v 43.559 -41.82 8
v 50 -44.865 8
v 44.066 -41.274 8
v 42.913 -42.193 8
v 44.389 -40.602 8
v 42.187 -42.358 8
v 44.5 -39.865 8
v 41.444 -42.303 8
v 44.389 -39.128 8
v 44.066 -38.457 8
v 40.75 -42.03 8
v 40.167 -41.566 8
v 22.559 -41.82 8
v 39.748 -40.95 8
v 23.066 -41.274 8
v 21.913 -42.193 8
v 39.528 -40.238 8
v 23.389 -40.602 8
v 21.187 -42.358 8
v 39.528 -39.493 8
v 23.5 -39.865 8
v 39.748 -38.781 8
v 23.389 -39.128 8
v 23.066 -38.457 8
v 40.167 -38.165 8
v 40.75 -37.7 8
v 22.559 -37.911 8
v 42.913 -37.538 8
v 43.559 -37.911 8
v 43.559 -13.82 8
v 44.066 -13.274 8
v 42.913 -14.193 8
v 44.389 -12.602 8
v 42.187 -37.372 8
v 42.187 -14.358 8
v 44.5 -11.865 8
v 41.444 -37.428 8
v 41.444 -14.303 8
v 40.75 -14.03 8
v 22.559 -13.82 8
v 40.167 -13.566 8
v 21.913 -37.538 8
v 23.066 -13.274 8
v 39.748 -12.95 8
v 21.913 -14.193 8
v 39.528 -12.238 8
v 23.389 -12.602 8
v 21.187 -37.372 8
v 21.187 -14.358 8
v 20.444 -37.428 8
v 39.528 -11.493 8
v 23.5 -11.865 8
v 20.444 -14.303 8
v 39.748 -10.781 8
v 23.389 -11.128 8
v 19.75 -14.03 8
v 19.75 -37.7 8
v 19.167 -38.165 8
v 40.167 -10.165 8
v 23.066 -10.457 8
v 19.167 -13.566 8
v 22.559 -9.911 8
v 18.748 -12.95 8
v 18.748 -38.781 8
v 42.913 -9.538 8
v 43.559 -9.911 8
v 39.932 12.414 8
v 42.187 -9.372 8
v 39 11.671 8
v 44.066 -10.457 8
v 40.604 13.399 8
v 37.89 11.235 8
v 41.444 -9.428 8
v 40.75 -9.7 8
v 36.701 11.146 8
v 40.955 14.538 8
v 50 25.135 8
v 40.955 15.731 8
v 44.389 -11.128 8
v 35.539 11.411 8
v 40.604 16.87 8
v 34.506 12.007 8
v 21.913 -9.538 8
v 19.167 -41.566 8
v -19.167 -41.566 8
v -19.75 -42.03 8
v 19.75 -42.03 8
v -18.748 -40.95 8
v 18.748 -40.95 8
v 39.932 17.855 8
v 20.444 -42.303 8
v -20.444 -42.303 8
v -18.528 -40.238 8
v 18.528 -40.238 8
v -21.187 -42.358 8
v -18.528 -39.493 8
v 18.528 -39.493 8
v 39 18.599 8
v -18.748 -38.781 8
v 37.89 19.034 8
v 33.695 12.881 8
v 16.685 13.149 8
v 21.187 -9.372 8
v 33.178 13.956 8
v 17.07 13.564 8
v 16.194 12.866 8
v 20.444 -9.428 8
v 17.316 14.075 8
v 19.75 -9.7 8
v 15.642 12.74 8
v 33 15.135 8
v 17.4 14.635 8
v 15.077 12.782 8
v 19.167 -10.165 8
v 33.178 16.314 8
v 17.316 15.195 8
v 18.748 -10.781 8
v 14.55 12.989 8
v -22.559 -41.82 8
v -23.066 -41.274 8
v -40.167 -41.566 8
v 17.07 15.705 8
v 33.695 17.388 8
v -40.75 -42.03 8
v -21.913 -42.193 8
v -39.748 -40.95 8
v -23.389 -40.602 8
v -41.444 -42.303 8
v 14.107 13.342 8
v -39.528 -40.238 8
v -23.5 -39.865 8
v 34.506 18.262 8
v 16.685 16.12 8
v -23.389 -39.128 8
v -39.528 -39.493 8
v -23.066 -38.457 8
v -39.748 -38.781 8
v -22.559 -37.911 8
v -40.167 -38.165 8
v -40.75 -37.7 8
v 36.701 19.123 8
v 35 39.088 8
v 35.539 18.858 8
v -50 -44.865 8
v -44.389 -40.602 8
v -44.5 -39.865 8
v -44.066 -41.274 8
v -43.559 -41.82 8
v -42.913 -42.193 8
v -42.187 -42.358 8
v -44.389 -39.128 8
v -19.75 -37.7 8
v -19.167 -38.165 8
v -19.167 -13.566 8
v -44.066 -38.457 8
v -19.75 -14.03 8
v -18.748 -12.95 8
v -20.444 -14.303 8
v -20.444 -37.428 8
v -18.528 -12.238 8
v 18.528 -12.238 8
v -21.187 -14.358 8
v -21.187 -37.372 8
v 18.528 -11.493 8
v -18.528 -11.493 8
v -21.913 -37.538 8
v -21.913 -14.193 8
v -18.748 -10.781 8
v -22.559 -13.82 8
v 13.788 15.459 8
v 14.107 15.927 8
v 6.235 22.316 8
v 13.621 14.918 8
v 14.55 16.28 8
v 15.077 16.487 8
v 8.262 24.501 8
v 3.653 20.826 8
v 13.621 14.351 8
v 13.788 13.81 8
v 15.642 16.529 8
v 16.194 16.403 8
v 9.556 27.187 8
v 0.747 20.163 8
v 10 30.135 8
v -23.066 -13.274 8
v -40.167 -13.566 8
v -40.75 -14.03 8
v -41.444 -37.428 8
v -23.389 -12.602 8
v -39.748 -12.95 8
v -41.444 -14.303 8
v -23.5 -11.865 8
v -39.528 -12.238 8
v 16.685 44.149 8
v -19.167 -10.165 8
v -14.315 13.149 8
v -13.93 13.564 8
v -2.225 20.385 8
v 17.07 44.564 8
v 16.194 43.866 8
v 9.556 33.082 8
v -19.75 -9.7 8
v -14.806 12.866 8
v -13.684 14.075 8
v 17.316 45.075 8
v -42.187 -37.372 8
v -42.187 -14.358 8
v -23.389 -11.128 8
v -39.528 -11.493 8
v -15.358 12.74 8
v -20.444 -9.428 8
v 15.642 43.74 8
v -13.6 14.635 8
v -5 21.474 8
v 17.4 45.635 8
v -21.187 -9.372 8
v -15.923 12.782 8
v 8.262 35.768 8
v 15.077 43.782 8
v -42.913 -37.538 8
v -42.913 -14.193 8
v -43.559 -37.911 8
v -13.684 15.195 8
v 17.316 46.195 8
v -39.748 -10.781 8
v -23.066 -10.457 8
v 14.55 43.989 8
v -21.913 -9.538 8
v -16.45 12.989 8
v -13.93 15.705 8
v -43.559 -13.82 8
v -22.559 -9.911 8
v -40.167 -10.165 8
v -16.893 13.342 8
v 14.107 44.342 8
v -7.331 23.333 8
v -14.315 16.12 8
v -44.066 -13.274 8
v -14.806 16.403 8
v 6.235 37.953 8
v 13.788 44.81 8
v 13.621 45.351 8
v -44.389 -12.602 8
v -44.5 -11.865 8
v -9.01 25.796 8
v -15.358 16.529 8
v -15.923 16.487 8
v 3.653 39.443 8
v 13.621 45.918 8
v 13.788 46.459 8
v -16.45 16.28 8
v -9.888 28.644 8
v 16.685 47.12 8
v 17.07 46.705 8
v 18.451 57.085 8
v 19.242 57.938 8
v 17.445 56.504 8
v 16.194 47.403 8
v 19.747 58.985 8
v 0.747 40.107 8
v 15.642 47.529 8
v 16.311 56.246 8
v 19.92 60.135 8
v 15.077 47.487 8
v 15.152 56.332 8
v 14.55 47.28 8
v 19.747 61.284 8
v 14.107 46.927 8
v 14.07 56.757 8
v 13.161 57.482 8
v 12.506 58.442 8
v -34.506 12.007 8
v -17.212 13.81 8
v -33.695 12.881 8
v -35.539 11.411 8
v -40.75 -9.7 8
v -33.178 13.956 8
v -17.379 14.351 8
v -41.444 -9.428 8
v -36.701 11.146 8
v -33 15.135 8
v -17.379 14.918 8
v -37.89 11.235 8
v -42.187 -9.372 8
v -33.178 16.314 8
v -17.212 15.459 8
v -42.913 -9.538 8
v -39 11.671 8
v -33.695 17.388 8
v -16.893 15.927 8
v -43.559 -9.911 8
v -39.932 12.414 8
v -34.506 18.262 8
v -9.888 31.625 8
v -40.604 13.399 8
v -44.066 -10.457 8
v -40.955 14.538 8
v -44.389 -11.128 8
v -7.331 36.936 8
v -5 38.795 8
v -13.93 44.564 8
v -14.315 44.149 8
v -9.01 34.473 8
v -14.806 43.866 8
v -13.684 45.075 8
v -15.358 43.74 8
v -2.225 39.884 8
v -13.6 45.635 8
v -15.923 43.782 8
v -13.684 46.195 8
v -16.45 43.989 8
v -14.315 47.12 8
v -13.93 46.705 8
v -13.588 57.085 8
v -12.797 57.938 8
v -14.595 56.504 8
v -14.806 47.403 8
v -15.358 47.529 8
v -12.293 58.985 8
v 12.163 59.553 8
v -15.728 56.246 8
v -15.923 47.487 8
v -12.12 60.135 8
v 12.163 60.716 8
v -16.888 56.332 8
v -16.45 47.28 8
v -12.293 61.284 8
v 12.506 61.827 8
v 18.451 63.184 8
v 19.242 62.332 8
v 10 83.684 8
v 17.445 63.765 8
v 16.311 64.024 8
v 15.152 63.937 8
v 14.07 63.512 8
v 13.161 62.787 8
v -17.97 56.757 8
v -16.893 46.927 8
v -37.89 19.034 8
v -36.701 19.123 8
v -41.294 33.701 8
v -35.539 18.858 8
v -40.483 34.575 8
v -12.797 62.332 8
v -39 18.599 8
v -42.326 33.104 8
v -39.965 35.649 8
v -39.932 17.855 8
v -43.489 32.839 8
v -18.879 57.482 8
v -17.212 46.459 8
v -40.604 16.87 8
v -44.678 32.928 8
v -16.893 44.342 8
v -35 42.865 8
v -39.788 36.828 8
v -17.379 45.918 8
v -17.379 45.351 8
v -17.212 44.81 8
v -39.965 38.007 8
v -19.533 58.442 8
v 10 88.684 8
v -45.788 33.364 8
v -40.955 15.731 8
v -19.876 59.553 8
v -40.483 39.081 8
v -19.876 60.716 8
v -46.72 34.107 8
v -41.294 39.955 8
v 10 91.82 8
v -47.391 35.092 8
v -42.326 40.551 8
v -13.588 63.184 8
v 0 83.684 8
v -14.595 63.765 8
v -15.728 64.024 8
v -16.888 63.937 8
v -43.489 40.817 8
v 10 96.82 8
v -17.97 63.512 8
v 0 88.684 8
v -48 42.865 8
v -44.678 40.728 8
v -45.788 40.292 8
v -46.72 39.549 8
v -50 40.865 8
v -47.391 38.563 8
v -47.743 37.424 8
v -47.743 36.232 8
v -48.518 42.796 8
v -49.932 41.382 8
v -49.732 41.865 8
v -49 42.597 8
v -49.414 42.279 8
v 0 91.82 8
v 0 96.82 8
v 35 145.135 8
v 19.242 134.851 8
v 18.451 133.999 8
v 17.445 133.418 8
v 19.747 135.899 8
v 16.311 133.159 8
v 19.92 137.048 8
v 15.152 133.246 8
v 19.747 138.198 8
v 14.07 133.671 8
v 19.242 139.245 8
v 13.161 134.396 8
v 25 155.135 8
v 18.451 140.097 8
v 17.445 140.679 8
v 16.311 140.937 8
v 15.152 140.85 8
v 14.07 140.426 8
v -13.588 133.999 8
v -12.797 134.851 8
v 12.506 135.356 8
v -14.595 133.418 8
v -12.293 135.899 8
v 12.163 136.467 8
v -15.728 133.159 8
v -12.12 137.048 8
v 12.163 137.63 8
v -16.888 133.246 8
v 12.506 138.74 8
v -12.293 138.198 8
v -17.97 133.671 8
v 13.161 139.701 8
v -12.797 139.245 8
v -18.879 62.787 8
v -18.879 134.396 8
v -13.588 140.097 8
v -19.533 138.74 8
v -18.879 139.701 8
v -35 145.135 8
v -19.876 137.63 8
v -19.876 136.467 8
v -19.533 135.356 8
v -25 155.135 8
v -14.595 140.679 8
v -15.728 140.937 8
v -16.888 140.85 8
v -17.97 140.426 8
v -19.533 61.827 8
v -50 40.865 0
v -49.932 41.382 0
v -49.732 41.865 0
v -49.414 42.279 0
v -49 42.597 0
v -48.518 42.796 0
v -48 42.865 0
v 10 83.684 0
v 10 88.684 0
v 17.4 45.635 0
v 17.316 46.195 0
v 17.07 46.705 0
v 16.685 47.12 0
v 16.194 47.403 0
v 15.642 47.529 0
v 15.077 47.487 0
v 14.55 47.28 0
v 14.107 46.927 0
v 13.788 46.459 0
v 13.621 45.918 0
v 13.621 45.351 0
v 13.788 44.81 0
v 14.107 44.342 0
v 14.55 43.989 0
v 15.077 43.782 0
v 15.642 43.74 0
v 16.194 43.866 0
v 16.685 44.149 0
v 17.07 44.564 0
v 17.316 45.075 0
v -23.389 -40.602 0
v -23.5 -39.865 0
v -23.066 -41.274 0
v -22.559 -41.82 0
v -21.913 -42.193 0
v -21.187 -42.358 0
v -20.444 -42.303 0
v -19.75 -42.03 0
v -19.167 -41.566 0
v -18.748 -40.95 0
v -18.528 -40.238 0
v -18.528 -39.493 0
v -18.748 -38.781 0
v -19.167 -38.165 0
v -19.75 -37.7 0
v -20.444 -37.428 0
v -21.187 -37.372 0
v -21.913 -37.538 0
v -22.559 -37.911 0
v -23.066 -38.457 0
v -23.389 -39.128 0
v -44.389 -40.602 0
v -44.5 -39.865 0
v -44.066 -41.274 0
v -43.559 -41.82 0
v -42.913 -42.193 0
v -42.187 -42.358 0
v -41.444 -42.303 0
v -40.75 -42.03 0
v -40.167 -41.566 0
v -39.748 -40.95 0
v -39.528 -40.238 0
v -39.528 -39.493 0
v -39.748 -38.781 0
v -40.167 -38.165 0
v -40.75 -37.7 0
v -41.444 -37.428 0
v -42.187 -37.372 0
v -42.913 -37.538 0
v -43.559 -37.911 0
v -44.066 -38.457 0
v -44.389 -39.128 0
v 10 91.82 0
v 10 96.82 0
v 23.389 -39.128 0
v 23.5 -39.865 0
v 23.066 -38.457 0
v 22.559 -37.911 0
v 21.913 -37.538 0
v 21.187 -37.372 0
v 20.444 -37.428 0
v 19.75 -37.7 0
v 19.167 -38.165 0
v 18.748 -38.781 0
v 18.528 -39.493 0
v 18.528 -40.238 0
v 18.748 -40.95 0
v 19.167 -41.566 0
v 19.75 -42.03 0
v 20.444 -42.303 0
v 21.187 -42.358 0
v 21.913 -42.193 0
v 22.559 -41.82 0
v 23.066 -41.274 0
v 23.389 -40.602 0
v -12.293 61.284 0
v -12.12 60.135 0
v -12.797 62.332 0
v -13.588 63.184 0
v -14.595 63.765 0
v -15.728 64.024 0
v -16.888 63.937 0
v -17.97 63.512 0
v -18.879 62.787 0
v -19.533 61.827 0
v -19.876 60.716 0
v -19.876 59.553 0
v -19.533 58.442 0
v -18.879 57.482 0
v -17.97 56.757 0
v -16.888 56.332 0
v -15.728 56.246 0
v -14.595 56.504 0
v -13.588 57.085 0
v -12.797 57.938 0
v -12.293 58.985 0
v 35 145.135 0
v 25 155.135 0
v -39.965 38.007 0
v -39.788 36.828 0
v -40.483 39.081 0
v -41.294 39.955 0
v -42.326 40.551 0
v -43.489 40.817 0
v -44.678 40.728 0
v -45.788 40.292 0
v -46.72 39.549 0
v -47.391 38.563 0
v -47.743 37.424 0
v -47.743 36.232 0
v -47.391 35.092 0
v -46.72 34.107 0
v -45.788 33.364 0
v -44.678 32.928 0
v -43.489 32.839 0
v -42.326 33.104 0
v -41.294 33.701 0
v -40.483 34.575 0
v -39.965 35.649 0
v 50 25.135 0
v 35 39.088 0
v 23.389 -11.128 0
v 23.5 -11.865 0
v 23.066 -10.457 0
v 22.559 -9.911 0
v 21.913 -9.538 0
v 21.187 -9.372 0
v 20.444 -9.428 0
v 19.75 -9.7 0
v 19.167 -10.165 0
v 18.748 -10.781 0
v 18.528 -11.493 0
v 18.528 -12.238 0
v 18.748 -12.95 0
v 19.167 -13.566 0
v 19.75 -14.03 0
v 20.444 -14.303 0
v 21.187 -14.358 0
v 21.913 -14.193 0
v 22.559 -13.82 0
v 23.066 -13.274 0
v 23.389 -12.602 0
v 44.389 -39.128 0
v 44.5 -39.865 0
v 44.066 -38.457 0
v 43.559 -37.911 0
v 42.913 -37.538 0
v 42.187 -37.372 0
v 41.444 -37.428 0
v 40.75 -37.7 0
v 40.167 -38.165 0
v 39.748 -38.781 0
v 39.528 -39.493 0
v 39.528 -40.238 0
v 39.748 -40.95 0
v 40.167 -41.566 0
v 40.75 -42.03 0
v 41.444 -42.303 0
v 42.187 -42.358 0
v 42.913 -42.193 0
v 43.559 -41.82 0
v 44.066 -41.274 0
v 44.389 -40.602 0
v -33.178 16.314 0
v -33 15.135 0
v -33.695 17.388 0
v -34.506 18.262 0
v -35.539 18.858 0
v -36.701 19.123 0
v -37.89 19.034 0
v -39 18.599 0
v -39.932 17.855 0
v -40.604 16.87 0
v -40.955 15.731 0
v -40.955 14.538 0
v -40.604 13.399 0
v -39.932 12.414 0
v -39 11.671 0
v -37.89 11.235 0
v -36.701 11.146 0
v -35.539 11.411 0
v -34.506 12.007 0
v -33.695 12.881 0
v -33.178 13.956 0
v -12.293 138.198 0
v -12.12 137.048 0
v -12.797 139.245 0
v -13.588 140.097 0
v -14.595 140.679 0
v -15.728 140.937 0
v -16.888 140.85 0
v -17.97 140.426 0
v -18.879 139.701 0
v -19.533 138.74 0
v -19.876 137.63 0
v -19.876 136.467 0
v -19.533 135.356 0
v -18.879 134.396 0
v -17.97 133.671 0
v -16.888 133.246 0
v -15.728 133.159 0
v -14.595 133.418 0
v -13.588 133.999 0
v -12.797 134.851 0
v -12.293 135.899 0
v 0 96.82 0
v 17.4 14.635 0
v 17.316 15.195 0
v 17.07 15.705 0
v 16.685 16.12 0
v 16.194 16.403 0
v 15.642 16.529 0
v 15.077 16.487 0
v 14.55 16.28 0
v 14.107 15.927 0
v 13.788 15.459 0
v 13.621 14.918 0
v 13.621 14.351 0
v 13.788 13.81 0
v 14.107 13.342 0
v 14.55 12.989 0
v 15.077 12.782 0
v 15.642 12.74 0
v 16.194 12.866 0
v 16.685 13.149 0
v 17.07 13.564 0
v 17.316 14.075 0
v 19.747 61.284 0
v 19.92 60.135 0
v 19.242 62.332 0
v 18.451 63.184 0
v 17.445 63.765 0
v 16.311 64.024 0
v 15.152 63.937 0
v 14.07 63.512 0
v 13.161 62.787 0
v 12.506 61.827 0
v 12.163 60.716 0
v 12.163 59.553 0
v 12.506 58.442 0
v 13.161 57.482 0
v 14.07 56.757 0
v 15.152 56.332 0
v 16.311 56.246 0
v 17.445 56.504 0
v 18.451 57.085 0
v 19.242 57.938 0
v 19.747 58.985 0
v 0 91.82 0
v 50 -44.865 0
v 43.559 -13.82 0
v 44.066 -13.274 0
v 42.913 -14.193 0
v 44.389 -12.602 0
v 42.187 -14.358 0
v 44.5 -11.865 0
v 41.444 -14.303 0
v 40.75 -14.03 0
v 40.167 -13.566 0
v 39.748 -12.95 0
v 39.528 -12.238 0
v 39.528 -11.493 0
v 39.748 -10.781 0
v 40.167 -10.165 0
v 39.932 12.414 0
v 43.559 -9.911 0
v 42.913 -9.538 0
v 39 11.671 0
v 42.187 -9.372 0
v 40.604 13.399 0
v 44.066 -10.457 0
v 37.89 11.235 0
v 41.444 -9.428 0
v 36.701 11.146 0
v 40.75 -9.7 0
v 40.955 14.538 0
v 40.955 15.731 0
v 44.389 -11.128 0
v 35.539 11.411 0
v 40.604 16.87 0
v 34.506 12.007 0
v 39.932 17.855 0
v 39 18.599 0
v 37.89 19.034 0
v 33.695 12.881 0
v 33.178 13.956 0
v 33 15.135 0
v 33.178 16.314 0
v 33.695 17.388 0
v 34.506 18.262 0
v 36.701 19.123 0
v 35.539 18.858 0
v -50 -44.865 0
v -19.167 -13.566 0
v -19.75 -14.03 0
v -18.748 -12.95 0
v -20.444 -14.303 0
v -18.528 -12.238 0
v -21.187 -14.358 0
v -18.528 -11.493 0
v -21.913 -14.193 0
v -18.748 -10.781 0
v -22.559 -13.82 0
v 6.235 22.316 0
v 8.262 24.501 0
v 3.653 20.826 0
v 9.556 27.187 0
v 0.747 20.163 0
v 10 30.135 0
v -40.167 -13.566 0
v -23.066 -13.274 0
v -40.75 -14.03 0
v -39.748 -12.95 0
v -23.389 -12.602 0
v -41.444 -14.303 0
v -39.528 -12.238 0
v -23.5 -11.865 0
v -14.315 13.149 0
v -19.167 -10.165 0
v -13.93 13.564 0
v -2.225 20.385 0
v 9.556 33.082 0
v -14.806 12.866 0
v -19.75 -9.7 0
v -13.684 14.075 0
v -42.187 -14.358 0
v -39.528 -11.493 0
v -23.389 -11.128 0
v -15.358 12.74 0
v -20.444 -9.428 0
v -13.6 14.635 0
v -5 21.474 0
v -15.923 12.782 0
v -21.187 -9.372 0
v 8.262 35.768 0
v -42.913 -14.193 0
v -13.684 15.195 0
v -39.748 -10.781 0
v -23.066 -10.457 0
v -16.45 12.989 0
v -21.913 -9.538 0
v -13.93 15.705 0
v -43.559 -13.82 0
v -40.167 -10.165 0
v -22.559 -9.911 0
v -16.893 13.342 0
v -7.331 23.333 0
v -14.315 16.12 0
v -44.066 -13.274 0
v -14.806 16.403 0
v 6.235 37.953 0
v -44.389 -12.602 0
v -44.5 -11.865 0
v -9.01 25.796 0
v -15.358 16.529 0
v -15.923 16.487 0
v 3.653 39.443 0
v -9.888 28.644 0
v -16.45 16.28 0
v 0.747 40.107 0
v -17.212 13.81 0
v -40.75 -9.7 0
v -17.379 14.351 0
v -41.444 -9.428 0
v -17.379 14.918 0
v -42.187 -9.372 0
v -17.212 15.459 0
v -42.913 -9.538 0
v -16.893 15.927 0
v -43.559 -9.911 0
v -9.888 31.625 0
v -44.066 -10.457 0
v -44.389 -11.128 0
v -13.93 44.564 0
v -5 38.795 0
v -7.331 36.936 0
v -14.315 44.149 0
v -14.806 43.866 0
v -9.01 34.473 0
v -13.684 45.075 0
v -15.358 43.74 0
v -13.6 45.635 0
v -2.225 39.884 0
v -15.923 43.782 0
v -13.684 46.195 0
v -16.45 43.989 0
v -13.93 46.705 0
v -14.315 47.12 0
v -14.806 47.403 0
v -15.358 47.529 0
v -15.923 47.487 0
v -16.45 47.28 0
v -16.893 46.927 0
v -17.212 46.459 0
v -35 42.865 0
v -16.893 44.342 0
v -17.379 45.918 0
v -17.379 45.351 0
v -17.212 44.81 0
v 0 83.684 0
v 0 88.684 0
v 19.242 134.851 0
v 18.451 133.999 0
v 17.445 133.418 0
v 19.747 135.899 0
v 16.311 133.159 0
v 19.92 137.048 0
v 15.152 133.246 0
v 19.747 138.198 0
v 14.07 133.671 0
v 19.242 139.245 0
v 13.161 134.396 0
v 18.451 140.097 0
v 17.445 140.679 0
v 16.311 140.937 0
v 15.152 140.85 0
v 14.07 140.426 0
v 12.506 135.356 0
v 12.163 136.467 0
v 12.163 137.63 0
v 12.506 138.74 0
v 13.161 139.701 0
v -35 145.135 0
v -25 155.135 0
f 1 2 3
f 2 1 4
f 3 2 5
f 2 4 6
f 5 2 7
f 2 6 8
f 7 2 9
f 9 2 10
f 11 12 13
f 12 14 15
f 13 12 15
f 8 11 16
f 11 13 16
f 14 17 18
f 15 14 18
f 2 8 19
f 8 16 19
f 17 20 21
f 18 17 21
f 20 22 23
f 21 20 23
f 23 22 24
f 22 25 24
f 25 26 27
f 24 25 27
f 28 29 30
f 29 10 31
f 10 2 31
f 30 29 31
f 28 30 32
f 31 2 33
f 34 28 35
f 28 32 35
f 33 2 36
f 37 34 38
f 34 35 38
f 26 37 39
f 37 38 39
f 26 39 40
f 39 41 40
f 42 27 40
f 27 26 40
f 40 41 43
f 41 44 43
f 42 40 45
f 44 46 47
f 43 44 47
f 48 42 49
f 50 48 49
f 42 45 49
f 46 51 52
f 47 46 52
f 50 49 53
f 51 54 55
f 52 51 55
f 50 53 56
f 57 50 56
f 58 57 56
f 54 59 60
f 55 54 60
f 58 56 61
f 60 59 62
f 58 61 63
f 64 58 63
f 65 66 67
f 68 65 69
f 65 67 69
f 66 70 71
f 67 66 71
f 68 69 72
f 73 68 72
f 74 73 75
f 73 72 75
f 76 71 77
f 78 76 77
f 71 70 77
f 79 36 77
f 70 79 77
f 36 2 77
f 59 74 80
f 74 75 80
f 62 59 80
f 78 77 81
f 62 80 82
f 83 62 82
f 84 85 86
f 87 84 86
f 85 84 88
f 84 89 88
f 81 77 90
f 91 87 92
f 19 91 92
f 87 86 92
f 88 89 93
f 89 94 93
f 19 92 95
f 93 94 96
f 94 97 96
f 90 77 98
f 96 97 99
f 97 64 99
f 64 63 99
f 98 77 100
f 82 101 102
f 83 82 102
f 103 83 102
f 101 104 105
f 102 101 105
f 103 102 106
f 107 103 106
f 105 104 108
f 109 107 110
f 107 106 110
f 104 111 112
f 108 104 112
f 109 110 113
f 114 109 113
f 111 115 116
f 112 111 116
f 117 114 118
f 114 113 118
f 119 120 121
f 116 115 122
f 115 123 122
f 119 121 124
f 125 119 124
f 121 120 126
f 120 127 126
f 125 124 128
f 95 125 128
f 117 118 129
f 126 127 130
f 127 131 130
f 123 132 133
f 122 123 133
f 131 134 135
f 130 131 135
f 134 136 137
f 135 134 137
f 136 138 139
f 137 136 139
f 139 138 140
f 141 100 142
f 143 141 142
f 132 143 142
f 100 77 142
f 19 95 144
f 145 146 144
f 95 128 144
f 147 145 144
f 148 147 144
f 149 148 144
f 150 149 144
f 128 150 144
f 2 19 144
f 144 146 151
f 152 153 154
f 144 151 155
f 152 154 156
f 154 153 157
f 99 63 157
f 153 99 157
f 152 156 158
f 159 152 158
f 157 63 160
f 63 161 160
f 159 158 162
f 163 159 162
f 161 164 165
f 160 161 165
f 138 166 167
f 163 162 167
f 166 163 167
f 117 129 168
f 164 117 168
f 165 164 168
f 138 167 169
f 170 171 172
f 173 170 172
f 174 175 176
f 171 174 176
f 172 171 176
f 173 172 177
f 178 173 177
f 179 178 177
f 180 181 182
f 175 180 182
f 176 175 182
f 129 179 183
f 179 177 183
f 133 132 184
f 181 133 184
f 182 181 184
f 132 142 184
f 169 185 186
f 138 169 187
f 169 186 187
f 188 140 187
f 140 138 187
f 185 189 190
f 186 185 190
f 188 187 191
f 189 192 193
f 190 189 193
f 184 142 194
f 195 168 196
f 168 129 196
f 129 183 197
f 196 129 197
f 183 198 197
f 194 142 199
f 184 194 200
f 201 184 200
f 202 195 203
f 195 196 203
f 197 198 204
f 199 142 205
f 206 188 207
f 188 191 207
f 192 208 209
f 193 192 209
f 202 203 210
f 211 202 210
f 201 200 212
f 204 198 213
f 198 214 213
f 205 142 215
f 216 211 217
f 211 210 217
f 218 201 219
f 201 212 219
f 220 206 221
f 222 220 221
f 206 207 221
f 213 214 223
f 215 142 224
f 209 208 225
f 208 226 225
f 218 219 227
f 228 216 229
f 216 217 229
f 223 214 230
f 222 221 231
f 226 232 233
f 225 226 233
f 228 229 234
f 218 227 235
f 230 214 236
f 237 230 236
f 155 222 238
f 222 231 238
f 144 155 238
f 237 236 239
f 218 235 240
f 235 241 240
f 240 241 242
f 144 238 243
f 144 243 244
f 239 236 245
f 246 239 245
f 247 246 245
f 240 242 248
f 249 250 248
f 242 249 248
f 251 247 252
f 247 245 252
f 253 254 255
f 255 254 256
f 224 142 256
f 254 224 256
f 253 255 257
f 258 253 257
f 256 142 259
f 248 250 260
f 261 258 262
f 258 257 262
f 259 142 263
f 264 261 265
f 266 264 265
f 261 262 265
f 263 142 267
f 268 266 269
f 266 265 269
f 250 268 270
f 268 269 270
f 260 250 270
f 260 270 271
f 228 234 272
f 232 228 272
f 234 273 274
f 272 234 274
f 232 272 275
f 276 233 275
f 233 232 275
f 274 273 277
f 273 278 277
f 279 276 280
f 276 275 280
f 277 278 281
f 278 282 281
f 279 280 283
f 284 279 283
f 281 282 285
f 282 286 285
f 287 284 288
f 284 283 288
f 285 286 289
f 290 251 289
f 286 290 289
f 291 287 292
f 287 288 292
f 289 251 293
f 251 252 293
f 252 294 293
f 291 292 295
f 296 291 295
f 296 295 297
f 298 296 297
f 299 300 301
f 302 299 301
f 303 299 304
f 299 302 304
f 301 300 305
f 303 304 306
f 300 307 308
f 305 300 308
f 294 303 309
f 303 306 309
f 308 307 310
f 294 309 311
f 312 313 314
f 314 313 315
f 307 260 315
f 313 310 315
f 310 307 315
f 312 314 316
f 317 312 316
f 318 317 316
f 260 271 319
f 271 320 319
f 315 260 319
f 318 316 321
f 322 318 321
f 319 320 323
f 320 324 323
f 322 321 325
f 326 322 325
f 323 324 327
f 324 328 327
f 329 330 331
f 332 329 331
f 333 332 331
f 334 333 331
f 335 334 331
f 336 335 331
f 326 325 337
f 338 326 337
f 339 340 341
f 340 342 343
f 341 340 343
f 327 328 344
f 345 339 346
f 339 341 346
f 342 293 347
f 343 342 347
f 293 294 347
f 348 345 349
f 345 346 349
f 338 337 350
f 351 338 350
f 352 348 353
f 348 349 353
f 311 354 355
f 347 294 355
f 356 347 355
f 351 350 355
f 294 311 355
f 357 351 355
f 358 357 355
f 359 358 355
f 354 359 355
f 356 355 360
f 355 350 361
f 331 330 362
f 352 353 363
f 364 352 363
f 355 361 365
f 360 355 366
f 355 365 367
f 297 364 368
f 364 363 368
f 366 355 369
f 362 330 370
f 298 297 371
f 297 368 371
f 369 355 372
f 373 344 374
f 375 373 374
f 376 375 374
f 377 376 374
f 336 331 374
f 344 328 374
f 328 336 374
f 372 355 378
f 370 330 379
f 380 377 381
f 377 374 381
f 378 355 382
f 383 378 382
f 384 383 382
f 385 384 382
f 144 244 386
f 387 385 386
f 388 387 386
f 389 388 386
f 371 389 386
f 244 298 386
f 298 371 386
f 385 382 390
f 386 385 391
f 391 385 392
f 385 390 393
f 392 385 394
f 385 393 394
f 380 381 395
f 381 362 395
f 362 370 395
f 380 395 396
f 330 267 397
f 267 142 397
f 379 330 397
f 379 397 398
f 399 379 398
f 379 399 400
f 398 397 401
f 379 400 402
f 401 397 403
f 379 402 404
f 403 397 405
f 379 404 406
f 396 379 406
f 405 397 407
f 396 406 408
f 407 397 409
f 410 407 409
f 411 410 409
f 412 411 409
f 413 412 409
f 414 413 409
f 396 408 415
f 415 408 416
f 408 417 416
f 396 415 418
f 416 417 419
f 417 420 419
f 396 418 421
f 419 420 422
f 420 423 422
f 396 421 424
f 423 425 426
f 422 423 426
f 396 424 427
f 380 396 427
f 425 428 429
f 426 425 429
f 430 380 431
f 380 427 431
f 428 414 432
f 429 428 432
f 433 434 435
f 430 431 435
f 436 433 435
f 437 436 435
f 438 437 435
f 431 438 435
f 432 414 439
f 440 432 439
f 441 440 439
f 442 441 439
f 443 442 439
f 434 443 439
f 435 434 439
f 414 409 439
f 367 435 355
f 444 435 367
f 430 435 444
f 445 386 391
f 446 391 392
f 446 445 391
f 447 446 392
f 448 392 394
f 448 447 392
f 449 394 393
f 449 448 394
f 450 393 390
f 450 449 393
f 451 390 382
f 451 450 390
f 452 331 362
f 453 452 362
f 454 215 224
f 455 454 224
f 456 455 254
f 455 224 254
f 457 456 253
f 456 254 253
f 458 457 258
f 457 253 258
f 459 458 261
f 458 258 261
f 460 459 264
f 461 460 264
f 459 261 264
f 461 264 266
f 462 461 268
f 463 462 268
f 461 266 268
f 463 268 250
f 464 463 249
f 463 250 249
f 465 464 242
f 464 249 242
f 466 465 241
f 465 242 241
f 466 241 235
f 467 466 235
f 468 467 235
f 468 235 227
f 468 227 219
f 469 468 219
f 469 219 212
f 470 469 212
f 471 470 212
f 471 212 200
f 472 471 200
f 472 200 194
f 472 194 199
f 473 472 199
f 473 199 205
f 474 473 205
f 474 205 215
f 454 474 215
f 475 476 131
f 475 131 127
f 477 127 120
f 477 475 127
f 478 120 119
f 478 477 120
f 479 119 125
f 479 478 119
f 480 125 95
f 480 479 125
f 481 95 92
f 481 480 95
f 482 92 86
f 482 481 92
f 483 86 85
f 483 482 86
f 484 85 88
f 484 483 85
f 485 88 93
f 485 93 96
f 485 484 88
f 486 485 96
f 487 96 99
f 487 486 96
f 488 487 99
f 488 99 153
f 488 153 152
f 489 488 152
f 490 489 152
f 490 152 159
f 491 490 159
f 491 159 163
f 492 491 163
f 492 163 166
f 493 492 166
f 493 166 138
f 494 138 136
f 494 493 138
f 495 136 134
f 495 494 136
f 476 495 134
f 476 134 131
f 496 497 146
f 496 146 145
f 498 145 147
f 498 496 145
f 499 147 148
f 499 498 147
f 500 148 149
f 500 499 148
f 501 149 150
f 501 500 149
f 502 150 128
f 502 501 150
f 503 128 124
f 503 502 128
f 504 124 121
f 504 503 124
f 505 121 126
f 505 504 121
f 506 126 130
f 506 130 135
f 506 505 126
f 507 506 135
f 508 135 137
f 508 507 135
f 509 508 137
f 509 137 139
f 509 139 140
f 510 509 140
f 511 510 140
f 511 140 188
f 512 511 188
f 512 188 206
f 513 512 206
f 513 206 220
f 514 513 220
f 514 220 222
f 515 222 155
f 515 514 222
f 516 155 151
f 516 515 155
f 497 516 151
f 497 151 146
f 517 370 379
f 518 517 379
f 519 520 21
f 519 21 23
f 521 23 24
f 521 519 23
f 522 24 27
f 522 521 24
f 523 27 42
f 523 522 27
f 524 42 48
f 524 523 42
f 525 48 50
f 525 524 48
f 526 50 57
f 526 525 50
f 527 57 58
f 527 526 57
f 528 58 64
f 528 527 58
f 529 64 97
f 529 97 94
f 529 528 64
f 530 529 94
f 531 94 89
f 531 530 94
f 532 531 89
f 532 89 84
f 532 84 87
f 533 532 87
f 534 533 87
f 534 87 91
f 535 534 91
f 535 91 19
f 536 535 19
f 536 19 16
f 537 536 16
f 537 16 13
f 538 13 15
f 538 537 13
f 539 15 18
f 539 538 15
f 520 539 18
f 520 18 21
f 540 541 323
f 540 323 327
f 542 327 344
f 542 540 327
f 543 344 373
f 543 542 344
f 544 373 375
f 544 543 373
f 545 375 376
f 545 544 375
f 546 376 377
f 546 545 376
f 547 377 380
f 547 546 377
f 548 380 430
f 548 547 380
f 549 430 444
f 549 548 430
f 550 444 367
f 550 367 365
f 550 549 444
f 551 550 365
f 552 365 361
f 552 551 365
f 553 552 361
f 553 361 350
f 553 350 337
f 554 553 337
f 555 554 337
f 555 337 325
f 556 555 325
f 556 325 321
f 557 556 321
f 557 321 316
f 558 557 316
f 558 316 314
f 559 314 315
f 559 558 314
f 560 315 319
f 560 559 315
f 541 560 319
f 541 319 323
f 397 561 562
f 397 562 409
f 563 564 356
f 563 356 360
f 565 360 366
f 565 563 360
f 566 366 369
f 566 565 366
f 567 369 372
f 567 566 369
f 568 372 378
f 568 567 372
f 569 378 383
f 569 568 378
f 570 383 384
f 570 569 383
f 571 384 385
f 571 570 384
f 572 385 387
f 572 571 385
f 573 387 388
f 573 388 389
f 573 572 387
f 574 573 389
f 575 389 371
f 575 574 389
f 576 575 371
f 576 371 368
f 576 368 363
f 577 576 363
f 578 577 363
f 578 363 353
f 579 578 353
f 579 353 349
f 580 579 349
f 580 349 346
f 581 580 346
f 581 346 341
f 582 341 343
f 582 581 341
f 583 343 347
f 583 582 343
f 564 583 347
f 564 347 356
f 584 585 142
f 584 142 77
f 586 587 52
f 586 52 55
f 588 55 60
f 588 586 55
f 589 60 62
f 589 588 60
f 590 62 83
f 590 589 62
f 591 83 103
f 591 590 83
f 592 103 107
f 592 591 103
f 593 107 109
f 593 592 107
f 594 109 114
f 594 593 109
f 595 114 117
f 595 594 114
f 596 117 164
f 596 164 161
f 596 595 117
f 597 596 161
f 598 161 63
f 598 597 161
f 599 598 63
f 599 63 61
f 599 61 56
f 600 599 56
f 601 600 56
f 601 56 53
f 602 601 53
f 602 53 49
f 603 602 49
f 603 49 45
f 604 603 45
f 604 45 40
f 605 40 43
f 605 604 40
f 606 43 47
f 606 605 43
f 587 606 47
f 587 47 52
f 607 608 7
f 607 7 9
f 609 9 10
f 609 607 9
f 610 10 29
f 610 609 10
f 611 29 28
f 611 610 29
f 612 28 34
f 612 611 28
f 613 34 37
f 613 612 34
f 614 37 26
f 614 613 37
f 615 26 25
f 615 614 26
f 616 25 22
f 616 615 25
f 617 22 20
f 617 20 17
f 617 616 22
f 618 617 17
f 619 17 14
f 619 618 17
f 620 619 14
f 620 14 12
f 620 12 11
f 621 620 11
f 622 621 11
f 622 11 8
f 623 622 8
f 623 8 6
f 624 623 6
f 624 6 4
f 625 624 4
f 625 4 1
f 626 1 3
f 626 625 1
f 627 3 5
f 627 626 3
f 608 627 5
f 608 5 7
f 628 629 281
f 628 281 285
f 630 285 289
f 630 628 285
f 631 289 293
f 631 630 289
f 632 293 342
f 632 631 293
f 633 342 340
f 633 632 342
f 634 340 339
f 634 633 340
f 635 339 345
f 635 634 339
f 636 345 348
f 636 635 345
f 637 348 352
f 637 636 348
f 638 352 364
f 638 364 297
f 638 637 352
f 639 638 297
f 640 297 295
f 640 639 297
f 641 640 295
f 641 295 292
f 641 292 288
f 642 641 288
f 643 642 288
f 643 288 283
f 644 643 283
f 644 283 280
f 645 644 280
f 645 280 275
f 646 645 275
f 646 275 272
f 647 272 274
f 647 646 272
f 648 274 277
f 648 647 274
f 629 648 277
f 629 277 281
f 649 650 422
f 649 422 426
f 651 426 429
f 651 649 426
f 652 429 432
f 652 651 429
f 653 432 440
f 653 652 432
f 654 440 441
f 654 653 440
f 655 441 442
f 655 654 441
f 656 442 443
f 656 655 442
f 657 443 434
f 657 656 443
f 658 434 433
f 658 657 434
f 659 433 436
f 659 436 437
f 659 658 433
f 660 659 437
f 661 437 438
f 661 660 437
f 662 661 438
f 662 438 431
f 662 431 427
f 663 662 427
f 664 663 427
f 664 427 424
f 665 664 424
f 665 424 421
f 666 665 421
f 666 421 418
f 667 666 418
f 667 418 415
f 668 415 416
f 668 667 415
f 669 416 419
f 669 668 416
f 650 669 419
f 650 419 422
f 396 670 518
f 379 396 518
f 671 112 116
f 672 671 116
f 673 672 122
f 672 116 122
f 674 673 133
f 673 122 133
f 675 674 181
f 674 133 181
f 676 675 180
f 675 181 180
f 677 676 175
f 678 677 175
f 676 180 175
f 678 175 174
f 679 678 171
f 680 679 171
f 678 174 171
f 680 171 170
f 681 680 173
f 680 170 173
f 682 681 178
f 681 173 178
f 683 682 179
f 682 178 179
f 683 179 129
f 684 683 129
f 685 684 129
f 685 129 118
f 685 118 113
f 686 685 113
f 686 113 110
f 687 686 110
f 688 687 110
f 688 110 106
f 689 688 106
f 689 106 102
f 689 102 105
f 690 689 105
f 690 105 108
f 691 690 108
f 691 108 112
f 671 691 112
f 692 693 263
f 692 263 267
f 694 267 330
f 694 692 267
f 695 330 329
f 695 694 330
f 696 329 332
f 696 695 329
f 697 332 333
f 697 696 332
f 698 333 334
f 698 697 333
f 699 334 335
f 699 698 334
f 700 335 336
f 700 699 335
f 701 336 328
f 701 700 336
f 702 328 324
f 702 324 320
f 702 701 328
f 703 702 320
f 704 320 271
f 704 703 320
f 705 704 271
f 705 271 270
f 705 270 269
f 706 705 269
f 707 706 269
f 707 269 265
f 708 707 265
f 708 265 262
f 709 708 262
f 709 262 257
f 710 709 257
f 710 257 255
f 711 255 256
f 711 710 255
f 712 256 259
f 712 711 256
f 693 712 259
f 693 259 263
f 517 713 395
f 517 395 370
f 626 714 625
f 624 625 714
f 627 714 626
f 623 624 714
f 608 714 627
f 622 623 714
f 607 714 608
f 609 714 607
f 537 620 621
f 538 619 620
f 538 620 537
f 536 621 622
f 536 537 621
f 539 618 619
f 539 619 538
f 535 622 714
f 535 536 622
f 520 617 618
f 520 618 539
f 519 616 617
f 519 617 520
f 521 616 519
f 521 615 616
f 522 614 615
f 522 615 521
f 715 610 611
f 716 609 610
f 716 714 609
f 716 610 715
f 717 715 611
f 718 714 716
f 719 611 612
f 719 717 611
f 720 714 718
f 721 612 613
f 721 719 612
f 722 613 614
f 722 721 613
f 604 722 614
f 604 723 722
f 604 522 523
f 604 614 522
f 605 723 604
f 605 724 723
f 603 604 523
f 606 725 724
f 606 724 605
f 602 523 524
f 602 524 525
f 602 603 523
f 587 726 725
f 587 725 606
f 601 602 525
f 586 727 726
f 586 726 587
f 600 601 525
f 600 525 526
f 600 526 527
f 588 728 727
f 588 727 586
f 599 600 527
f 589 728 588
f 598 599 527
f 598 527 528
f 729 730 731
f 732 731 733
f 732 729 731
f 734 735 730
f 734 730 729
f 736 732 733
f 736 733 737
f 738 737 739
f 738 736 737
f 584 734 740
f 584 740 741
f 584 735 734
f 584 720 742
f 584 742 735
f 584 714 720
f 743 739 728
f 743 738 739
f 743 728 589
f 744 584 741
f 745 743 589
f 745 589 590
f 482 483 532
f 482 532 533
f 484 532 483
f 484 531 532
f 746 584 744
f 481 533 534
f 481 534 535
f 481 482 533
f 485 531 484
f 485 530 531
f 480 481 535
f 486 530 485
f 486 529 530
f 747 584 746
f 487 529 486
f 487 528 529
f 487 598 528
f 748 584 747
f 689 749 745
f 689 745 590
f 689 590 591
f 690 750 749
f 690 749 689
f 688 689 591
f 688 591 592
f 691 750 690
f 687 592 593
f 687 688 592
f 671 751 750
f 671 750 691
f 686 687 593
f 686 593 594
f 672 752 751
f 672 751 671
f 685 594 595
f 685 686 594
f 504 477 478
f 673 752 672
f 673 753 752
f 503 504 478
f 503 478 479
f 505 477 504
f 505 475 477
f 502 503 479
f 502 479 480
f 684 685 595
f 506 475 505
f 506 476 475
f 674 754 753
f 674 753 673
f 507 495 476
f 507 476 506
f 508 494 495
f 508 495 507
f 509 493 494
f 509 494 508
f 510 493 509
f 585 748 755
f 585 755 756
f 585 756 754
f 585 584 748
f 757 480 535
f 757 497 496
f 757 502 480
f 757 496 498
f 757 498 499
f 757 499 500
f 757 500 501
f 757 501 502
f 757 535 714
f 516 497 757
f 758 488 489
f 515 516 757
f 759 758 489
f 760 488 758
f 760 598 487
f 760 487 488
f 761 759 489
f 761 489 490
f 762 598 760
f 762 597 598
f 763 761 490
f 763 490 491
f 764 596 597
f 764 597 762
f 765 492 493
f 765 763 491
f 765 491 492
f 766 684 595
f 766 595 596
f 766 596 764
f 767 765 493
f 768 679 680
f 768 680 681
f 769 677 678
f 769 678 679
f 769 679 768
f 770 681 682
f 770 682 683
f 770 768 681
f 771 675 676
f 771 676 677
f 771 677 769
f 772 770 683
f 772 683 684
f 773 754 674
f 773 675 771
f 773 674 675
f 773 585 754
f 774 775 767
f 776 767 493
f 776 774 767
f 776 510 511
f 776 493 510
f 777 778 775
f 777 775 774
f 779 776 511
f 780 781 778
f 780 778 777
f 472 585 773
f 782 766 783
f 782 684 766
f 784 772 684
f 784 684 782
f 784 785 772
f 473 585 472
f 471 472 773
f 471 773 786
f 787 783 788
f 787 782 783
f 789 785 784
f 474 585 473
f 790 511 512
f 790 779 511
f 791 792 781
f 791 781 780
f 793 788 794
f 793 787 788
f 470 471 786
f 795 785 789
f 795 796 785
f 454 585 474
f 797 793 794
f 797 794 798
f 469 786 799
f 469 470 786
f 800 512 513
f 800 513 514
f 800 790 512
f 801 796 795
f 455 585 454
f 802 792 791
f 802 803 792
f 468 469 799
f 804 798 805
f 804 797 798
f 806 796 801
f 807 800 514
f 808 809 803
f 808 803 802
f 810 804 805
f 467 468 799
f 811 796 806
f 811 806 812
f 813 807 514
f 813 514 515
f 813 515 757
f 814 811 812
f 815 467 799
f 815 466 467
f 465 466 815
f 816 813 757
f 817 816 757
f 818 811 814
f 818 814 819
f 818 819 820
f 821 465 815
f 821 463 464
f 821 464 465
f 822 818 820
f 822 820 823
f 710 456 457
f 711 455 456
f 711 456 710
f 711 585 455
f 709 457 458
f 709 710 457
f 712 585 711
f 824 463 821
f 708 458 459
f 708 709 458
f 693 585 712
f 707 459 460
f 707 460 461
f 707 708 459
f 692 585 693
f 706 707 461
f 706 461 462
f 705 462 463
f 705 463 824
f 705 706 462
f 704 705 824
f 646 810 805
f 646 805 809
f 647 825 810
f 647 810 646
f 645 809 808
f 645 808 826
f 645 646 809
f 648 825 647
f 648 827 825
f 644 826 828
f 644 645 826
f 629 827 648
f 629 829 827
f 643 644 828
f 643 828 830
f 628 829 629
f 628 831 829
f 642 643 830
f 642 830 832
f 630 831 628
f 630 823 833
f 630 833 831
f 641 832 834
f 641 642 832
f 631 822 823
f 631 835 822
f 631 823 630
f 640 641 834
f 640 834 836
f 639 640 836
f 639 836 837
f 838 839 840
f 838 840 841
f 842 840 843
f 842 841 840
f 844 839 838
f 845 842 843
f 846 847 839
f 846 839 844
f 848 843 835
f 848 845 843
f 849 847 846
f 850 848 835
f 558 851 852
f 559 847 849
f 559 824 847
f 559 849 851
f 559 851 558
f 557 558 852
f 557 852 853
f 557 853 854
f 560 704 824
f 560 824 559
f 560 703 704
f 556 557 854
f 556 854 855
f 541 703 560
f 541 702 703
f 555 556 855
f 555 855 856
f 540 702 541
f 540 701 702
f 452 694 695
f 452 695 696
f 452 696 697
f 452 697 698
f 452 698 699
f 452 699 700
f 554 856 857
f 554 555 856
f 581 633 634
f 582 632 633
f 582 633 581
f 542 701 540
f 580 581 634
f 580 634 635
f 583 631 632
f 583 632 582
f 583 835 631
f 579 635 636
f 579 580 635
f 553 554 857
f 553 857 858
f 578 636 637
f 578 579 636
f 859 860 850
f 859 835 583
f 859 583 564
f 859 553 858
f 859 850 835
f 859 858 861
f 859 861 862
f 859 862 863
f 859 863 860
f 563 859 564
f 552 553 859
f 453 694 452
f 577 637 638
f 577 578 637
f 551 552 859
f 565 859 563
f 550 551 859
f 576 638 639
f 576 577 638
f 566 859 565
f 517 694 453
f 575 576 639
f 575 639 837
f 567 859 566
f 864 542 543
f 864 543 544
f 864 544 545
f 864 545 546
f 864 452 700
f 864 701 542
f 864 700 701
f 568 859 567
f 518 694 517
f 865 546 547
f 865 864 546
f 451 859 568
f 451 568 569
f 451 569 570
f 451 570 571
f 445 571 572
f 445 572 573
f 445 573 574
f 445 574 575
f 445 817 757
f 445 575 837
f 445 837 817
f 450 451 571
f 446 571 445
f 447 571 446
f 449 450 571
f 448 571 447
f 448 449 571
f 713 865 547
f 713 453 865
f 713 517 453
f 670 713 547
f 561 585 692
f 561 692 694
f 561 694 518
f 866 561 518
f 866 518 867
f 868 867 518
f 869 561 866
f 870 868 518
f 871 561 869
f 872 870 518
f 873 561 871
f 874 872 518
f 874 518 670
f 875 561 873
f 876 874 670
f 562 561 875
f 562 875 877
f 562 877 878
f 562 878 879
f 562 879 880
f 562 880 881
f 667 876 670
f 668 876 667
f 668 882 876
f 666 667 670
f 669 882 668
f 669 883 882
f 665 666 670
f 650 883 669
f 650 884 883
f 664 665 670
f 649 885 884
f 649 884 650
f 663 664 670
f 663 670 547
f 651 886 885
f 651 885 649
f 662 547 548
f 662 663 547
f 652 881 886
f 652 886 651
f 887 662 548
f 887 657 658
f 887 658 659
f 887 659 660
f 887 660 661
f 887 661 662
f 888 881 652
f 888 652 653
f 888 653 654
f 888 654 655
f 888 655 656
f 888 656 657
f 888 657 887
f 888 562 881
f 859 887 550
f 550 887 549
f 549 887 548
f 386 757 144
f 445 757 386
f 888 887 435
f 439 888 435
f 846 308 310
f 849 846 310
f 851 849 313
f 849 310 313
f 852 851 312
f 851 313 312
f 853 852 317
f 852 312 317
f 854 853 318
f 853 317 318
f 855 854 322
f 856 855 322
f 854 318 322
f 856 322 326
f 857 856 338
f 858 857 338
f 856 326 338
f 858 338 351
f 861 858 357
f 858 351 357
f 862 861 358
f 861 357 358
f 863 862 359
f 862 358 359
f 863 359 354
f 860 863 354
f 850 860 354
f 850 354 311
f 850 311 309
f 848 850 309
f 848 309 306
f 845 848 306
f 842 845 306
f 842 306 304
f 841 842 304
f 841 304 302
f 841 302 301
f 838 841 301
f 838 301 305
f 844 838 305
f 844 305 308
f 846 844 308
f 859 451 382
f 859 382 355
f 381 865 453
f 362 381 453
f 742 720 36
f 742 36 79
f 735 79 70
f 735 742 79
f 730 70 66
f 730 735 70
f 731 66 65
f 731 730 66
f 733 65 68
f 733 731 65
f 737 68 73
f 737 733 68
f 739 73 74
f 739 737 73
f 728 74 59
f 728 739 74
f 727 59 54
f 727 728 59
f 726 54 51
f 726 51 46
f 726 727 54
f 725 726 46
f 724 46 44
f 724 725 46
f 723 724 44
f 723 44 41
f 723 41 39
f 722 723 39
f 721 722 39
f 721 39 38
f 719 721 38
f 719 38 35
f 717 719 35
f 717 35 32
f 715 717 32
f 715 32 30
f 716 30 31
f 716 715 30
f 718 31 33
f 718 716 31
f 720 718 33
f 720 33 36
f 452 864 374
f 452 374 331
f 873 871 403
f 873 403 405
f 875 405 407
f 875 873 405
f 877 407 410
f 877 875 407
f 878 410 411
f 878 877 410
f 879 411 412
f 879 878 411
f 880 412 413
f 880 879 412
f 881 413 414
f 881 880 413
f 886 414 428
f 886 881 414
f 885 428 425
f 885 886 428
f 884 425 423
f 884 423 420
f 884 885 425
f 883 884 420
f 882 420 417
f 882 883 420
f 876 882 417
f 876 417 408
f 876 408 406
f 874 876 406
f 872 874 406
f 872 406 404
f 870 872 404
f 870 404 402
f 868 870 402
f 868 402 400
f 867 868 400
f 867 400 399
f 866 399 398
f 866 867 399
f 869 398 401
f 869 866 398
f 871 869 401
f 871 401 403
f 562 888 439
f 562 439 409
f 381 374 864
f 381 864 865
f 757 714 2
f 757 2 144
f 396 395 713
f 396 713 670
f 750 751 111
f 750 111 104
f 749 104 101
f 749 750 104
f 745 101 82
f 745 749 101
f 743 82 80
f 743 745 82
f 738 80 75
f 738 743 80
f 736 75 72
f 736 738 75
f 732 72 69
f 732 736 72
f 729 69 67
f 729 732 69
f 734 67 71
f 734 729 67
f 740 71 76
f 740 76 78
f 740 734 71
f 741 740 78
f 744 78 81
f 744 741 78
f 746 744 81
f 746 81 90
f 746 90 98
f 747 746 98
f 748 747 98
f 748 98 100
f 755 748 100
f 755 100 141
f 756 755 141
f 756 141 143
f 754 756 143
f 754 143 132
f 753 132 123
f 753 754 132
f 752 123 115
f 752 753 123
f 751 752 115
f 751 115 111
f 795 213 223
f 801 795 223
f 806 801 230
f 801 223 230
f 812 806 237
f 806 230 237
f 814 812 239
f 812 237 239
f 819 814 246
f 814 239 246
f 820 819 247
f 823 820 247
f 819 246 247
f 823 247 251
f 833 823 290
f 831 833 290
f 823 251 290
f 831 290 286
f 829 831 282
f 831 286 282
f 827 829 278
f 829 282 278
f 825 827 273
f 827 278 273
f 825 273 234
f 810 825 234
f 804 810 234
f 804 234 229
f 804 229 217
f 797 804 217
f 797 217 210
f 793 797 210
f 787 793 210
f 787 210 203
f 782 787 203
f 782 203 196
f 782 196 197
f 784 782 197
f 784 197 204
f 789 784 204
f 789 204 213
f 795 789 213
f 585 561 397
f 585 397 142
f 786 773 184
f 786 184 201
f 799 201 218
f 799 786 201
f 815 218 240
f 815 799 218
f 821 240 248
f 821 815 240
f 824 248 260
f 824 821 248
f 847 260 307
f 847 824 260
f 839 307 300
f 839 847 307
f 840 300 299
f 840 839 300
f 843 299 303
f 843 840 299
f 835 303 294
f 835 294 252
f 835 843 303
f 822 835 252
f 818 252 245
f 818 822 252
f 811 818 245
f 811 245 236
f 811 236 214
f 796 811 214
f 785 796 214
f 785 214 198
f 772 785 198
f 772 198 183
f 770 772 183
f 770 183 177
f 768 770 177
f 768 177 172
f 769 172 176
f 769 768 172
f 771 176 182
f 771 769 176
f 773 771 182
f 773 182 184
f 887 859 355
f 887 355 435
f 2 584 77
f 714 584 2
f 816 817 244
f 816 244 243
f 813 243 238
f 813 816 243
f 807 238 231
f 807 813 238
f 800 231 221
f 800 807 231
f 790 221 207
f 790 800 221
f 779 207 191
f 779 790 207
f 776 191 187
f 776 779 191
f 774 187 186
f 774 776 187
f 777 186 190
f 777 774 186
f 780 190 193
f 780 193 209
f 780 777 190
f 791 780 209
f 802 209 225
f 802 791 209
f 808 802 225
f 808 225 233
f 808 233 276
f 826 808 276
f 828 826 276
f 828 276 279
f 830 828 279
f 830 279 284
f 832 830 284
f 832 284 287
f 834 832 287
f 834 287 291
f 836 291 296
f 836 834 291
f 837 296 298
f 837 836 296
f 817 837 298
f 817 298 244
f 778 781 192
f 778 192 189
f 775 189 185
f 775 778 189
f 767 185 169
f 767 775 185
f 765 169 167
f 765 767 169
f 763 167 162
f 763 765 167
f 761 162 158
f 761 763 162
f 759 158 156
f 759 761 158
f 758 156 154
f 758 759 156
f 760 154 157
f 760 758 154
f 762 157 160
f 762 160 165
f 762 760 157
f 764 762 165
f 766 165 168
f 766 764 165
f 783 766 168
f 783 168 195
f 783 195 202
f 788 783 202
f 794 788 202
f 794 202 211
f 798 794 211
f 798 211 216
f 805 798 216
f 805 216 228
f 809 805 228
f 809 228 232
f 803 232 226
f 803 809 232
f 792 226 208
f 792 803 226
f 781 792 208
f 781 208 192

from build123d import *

# Parameters (mm, degrees)
SKETCH2_R           = 4
SKETCH2_R_2         = 10
SKETCH2_R_3         = 2.5
SKETCH2_R_4         = 3.9
SKETCH2_W           = 10
SKETCH2_H           = 5
BOSS_EXTRUDE2_DEPTH = 8
SKETCH3_R           = 1.9
CUT_EXTRUDE1_DEPTH  = 10
CHAMFER1_SIZE       = 10


with BuildPart() as part:
    # Sketch2 → Boss-Extrude2 (new body)
    with BuildSketch(Plane.XY):
        with BuildLine():
            Line((50, -44.865381447), (-50, -44.865381447))
            Line((-50, -44.865381447), (-50, 25.134618553))
            Line((-50, 25.134618553), (-50, 40.864537659))
            ThreePointArc((-50, 40.864537659), (-49.414213562, 42.278751221), (-48, 42.864537659))
            Line((-48, 42.864537659), (-35, 42.864537659))
            Line((-35, 42.864537659), (-35, 155.134618553))
            Line((-35, 155.134618553), (35, 155.134618553))
            Line((35, 155.134618553), (35, 39.08785688))
            Line((35, 39.08785688), (50, 25.134618553))
            Line((50, 25.134618553), (50, -44.865381447))
        make_face()
        with Locations((-37, 15.134618553)):
            Circle(SKETCH2_R, mode=Mode.SUBTRACT)
        with Locations((37, 15.134618553)):
            Circle(SKETCH2_R, mode=Mode.SUBTRACT)
        with Locations((0, 30.134618553)):
            Circle(SKETCH2_R_2, mode=Mode.SUBTRACT)
        with Locations((42, -39.865381447)):
            Circle(SKETCH2_R_3, mode=Mode.SUBTRACT)
        with Locations((21, -39.865381447)):
            Circle(SKETCH2_R_3, mode=Mode.SUBTRACT)
        with Locations((-43.787591992, 36.827877872)):
            Circle(SKETCH2_R, mode=Mode.SUBTRACT)
        with Locations((42, -11.865381447)):
            Circle(SKETCH2_R_3, mode=Mode.SUBTRACT)
        with Locations((21, -11.865381447)):
            Circle(SKETCH2_R_3, mode=Mode.SUBTRACT)
        with Locations((-21, -11.865381447)):
            Circle(SKETCH2_R_3, mode=Mode.SUBTRACT)
        with Locations((-42, -11.865381447)):
            Circle(SKETCH2_R_3, mode=Mode.SUBTRACT)
        with Locations((-21, -39.865381447)):
            Circle(SKETCH2_R_3, mode=Mode.SUBTRACT)
        with Locations((-42, -39.865381447)):
            Circle(SKETCH2_R_3, mode=Mode.SUBTRACT)
        with Locations((-16.01970462, 60.134618553)):
            Circle(SKETCH2_R_4, mode=Mode.SUBTRACT)
        with Locations((16.019778849, 60.134618553)):
            Circle(SKETCH2_R_4, mode=Mode.SUBTRACT)
        with Locations((-16.01970462, 137.048261945)):
            Circle(SKETCH2_R_4, mode=Mode.SUBTRACT)
        with Locations((16.019778849, 137.048261945)):
            Circle(SKETCH2_R_4, mode=Mode.SUBTRACT)
        with Locations((5, 86.183799898)):
            Rectangle(SKETCH2_W, SKETCH2_H, mode=Mode.SUBTRACT)
        with Locations((5, 94.319599175)):
            Rectangle(SKETCH2_W, SKETCH2_H, mode=Mode.SUBTRACT)
    extrude(amount=BOSS_EXTRUDE2_DEPTH)

    # Sketch3 → Cut-Extrude1 (cut)
    with BuildSketch(Plane.XY.offset(8)):
        with Locations((-15.5, 14.634618553)):
            Circle(SKETCH3_R)
        with Locations((-15.5, 45.634618553)):
            Circle(SKETCH3_R)
        with Locations((15.5, 45.634618553)):
            Circle(SKETCH3_R)
        with Locations((15.5, 14.634618553)):
            Circle(SKETCH3_R)
    extrude(amount=-CUT_EXTRUDE1_DEPTH, mode=Mode.SUBTRACT)

    # Chamfer1
    chamfer1_edges = [part.edges().sort_by_distance(p)[0] for p in [
        (35, 155.134618553, 4),
        (-35, 155.134618553, 4),
    ]]
    chamfer(chamfer1_edges, length=CHAMFER1_SIZE)


solid = part.part
